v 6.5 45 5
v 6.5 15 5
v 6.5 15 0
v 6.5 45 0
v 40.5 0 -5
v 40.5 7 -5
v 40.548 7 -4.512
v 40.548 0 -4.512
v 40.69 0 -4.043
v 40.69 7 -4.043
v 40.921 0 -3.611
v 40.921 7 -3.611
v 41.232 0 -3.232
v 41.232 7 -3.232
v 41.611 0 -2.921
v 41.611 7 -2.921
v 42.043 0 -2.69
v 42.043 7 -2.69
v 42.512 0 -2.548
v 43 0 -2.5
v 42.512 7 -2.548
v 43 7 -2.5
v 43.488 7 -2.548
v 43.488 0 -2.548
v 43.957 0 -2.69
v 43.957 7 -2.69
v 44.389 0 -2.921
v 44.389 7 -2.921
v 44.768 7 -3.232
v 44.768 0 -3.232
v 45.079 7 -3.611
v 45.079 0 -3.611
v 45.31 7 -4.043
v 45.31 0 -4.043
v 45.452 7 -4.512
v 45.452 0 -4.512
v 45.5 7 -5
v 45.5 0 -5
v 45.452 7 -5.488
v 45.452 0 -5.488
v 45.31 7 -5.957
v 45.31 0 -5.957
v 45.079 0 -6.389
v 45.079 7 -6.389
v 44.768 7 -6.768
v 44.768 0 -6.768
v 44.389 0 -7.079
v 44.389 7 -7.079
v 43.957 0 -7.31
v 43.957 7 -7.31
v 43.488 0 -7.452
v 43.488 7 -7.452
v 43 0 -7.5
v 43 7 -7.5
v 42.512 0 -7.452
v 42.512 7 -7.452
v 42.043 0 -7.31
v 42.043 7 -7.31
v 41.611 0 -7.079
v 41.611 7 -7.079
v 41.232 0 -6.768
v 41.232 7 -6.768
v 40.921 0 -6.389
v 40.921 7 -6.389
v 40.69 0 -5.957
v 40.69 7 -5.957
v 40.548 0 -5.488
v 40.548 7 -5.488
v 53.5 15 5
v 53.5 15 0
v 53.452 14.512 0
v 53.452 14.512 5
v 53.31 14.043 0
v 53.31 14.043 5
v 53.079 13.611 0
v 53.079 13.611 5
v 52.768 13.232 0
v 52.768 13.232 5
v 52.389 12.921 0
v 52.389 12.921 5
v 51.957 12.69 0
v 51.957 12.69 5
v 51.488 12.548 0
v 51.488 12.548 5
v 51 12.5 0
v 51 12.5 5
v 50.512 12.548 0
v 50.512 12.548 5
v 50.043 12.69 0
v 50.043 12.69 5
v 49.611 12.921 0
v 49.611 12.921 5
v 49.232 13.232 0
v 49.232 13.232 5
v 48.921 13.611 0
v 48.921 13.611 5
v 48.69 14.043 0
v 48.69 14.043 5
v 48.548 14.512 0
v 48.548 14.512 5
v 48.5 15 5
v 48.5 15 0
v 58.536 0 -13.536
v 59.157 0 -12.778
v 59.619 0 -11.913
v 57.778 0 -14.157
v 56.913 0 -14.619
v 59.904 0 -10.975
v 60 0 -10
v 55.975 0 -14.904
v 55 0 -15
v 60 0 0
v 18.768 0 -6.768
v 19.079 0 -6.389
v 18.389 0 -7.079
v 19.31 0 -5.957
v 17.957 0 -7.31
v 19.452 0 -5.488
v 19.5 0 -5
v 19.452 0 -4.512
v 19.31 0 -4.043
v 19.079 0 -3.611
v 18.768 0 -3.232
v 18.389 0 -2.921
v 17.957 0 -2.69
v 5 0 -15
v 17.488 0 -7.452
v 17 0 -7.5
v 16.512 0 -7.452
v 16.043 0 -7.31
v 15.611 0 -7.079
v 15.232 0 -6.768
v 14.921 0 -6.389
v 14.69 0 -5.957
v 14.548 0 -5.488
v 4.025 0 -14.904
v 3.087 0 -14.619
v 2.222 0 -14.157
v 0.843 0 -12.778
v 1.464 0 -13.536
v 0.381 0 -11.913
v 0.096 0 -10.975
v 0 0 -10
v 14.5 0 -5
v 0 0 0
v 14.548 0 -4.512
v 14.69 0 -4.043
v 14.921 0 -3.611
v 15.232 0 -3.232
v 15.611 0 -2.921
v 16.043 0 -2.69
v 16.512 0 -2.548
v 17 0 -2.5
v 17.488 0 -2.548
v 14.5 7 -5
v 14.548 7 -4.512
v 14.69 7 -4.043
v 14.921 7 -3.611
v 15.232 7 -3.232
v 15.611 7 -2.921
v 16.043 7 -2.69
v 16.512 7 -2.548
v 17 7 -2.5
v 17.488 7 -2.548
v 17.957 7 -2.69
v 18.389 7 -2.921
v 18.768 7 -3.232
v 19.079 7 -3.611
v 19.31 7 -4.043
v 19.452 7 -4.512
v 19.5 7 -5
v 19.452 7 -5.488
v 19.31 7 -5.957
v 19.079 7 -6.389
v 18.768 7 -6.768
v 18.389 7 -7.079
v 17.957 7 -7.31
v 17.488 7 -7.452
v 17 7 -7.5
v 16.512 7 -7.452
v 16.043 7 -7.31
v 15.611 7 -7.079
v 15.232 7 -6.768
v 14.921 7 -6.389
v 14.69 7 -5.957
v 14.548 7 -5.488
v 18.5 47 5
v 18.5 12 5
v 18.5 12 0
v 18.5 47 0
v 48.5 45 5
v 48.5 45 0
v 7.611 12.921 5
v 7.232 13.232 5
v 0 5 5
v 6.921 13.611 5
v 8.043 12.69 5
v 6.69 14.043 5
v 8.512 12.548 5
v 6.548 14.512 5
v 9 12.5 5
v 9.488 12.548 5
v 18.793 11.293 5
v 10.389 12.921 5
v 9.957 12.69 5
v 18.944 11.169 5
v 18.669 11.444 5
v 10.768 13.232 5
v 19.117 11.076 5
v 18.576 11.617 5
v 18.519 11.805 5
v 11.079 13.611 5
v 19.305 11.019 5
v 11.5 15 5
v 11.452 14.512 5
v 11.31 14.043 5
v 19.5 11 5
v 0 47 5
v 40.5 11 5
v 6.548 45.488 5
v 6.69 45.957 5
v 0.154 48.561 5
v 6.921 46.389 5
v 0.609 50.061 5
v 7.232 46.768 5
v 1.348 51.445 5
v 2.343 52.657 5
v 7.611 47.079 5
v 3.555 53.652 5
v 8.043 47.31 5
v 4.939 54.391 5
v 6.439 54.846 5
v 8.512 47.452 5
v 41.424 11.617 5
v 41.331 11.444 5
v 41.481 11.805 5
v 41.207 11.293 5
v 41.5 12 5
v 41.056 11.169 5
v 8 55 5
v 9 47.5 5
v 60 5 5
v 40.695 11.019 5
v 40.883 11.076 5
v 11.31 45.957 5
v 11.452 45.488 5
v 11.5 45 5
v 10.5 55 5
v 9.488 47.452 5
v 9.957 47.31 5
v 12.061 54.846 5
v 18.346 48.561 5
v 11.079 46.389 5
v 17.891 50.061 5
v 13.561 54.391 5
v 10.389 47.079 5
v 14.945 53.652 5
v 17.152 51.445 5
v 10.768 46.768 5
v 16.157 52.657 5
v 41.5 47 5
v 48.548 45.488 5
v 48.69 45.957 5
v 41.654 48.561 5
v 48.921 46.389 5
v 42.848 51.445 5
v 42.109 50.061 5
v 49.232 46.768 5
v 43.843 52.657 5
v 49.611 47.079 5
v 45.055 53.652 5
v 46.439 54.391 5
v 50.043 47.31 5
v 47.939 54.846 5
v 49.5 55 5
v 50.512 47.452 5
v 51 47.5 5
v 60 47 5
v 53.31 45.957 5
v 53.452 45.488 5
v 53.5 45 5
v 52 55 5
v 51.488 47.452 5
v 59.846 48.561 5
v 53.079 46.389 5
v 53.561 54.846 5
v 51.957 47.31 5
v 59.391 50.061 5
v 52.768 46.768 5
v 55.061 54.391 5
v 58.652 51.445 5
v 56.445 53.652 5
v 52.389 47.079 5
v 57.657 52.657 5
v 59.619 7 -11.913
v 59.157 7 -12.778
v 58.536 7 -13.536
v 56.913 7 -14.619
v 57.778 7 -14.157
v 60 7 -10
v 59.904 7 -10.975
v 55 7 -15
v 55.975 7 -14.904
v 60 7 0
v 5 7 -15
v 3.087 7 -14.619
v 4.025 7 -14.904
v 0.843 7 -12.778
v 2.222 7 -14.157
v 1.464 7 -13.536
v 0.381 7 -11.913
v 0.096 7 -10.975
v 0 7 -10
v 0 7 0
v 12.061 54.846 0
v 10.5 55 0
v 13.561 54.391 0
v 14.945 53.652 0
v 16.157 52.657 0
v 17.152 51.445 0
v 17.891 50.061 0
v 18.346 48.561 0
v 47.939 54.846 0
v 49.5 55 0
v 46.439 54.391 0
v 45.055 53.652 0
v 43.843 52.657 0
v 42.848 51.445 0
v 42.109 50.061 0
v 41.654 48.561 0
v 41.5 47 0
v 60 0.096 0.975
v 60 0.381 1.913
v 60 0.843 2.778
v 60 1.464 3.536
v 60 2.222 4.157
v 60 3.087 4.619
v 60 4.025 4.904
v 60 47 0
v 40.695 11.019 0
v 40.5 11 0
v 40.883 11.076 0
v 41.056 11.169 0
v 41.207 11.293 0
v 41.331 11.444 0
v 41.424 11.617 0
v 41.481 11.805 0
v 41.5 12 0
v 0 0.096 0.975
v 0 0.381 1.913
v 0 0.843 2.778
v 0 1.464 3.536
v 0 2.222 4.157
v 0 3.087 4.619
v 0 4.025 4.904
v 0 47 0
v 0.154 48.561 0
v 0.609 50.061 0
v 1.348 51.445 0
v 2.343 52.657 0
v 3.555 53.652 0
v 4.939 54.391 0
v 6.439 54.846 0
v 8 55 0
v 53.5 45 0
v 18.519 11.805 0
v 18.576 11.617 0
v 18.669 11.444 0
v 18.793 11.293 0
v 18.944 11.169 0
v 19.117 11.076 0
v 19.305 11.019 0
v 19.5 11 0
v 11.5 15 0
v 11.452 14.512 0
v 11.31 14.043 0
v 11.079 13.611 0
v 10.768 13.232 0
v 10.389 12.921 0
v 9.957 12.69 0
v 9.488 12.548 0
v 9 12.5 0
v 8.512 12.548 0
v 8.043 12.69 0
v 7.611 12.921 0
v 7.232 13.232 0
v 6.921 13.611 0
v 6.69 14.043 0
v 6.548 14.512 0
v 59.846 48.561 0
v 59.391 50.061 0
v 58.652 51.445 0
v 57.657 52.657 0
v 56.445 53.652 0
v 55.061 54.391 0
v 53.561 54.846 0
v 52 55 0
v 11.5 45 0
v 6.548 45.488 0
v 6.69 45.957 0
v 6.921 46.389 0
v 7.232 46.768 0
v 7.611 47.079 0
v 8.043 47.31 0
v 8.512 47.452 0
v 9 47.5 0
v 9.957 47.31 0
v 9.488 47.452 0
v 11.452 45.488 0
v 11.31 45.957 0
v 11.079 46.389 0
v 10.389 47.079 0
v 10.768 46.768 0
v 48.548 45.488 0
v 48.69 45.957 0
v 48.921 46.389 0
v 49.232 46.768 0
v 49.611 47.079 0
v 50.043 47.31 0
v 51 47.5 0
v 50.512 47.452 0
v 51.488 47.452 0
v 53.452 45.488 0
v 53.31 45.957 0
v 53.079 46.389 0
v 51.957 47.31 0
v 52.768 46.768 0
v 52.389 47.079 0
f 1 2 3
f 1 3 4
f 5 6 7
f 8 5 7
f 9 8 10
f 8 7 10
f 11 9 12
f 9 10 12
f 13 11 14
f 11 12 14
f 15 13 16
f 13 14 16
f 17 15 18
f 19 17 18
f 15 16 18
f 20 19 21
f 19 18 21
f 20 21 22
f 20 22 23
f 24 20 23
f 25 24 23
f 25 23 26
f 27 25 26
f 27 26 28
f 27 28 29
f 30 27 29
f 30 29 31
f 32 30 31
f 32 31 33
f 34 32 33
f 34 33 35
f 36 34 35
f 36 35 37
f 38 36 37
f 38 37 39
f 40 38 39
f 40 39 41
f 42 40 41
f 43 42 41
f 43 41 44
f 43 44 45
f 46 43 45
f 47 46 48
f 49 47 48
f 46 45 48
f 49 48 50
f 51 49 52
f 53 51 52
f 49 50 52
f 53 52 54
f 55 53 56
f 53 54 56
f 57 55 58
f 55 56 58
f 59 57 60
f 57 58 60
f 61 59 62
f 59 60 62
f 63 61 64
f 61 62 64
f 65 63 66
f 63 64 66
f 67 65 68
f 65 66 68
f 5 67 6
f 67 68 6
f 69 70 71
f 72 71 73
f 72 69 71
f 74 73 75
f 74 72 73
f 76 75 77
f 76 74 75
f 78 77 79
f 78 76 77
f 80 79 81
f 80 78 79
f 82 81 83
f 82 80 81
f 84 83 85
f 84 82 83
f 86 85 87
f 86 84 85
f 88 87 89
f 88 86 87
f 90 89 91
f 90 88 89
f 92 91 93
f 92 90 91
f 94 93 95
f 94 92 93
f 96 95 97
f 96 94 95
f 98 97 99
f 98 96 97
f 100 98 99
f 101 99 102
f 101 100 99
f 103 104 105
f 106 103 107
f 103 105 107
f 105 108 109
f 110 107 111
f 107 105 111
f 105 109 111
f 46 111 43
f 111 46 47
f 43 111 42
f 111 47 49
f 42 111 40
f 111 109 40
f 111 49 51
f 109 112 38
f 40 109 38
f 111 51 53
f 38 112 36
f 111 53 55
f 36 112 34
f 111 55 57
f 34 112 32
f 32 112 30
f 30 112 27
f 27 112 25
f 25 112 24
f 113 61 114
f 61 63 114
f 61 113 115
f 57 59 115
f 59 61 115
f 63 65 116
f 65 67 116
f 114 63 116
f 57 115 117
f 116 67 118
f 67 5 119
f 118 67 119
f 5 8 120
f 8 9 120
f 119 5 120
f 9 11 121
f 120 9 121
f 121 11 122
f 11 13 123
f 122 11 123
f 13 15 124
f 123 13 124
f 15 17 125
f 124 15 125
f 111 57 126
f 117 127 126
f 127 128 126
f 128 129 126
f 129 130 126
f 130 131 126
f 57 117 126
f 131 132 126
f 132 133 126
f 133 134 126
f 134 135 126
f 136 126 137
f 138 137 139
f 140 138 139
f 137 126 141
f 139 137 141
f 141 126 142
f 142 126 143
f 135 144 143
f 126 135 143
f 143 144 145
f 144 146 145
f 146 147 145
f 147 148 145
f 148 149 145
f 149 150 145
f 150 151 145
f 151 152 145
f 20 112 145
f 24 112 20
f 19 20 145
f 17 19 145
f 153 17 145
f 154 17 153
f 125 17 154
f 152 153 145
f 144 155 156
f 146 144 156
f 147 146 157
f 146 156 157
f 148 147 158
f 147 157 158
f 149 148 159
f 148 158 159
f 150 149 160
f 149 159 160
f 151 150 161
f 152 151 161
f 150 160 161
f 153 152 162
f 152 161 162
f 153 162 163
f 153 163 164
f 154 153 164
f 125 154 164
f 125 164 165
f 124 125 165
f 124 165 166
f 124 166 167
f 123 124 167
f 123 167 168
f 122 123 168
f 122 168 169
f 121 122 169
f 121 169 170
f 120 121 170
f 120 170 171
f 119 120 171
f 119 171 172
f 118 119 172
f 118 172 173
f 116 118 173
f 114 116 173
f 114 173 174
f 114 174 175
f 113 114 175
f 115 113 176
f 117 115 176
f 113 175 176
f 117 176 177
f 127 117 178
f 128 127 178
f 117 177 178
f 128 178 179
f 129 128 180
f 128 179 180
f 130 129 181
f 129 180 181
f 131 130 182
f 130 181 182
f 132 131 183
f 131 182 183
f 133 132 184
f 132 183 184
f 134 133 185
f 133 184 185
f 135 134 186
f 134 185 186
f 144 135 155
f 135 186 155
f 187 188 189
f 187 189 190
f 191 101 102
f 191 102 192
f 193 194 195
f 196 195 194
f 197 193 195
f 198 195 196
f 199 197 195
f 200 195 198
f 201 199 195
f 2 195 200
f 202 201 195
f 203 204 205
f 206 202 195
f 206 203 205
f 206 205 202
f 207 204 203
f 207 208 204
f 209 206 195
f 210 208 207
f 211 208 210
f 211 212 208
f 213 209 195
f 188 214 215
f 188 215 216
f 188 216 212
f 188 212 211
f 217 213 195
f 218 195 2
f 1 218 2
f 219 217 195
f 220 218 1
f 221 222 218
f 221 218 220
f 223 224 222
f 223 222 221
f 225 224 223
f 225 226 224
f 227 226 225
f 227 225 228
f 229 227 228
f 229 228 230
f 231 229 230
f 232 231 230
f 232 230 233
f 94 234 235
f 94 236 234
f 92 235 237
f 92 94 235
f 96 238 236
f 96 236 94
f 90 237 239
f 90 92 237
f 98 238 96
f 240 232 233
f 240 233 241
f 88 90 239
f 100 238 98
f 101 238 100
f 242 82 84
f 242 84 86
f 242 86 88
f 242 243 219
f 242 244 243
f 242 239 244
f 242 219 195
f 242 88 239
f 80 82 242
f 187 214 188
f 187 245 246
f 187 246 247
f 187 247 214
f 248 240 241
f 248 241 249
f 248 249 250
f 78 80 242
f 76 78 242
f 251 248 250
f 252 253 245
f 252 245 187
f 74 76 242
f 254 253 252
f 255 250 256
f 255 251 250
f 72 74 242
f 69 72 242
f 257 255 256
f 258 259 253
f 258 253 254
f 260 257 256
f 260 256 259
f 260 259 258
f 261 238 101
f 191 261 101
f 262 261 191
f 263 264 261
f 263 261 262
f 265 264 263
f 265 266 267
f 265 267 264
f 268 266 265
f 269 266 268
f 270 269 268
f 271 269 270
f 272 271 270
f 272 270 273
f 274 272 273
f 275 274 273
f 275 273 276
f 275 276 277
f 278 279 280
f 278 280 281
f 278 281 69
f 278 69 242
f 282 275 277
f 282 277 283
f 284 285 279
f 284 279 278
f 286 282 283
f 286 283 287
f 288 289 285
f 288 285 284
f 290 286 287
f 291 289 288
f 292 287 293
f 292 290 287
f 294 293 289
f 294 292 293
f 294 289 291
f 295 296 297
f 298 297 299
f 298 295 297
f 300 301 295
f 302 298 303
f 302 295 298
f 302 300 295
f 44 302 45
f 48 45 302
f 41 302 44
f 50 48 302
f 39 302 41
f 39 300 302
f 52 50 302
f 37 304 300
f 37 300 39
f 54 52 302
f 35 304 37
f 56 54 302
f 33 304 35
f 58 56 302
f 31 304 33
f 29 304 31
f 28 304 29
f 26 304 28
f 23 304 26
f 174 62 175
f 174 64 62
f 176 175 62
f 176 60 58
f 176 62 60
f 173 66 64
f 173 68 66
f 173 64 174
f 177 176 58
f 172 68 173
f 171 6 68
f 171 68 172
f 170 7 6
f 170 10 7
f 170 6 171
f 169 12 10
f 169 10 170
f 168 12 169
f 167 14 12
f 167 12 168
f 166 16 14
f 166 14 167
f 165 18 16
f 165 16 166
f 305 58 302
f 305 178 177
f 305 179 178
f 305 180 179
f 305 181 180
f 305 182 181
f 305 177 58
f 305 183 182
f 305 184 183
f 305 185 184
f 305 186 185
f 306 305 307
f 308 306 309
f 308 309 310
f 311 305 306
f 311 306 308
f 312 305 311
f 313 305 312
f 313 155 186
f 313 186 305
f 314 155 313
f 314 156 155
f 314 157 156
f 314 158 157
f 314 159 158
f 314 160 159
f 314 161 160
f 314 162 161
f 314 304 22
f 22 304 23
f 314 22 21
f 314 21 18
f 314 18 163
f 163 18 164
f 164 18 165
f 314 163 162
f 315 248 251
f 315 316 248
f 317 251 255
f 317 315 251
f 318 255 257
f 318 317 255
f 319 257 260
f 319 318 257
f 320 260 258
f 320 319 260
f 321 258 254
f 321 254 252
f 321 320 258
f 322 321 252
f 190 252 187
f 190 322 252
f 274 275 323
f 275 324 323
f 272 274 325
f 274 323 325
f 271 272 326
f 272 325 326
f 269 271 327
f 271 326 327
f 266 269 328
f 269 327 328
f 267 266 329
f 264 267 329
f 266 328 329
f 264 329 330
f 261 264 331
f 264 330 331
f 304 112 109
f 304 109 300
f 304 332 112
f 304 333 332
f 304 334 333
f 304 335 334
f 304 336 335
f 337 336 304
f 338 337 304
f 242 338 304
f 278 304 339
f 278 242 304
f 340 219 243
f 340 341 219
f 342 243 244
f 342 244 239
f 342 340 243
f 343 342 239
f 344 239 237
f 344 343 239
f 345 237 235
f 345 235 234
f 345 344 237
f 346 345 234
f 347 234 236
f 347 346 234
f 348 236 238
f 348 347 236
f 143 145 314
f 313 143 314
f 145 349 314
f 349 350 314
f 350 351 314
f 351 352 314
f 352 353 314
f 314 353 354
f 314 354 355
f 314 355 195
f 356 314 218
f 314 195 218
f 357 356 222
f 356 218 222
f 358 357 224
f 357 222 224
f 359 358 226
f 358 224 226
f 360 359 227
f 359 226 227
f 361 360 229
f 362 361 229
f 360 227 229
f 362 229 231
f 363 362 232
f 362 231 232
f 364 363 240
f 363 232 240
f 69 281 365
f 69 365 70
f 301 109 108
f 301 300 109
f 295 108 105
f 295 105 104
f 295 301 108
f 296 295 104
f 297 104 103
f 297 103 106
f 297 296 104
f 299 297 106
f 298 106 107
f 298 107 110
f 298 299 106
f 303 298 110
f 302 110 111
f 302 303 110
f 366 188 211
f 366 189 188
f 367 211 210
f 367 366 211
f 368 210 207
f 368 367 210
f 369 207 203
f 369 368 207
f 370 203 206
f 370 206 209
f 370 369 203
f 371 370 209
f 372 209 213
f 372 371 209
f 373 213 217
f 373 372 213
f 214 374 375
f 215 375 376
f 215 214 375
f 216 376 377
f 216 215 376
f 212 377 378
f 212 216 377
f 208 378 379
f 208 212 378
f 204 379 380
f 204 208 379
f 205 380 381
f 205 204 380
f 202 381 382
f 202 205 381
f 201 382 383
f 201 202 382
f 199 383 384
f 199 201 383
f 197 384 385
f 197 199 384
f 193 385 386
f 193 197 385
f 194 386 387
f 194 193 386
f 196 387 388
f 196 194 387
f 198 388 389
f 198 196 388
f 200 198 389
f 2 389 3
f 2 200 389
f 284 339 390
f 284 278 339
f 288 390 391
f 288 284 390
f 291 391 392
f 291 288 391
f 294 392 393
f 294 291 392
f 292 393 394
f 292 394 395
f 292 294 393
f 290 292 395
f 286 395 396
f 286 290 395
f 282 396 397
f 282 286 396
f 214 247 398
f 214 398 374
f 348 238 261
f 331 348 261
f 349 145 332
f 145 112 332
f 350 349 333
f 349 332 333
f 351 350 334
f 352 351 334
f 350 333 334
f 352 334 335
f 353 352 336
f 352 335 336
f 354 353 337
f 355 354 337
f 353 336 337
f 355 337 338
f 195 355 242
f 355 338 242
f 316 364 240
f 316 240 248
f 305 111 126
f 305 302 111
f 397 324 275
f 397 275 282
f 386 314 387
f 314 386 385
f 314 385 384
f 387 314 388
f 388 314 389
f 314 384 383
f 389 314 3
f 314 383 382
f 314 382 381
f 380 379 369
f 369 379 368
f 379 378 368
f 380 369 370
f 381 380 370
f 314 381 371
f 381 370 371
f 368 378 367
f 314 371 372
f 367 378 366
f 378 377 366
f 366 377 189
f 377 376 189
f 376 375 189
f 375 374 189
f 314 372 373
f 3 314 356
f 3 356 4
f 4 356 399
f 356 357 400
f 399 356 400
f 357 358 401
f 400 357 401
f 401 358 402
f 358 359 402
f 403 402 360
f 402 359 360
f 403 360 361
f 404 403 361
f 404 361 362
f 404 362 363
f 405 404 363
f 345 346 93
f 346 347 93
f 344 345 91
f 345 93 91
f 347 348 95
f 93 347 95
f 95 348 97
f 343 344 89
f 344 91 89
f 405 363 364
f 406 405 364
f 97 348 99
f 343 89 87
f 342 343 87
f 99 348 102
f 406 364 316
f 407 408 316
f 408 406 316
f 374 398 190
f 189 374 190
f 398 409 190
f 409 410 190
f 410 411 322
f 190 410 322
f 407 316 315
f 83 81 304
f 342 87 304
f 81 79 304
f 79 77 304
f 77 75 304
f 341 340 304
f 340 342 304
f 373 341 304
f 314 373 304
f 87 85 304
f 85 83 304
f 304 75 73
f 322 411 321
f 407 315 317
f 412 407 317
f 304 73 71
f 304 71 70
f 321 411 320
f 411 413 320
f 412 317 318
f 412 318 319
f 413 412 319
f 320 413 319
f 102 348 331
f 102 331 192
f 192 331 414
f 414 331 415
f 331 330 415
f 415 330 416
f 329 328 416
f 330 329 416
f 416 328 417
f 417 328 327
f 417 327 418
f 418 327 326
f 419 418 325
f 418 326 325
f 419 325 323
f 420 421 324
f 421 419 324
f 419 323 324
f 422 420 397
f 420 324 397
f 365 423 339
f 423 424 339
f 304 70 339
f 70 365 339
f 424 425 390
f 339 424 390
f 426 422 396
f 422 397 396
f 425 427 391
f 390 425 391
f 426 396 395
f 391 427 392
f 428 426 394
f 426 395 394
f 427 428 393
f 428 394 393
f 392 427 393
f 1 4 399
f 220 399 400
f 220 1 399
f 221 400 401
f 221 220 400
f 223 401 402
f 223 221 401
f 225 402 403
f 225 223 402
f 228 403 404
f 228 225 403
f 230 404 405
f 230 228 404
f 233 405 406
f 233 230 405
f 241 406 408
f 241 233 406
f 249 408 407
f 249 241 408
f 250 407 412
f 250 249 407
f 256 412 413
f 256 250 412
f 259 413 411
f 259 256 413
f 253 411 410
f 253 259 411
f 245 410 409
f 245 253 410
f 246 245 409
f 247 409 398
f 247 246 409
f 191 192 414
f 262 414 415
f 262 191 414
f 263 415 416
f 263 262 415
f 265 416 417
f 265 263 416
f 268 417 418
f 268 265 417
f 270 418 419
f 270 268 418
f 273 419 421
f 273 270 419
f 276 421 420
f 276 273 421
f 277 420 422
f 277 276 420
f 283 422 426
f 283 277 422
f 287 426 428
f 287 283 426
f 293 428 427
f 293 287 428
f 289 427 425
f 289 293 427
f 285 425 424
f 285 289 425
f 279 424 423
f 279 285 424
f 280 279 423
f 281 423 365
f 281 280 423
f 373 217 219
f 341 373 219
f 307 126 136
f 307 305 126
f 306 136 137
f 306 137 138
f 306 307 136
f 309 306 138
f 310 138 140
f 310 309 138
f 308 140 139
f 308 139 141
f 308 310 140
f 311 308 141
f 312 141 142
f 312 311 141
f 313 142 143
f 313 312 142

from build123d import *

# Parameters (mm, degrees)
SKETCH1_W           = 60
SKETCH1_H           = 55
BOSS_EXTRUDE1_DEPTH = 5
CUT_EXTRUDE1_REACH  = 83.548
SKETCH2_W           = 23
SKETCH2_H           = 44
SKETCH3_W           = 60
SKETCH3_H           = 7
BOSS_EXTRUDE2_DEPTH = 15
CUT_EXTRUDE2_REACH  = 80.288
SKETCH4_R           = 2.5
FILLET1_R           = 8
FILLET2_R           = 5
FILLET3_R           = 5
FILLET4_R           = 1


with BuildPart() as part:
    # Sketch1 → Boss-Extrude1 (new body)
    with BuildSketch(Plane.XY):
        with Locations((30, 27.5)):
            Rectangle(SKETCH1_W, SKETCH1_H)
    extrude(amount=BOSS_EXTRUDE1_DEPTH)

    # Sketch2 → Cut-Extrude1 (cut, up to next)
    with BuildSketch(Plane.XY.offset(5), mode=Mode.PRIVATE) as cut_extrude1_sk1:
        with BuildLine():
            Line((11.5, 45), (11.5, 15))
            ThreePointArc((11.5, 15), (9, 12.5), (6.5, 15))
            Line((6.5, 15), (6.5, 45))
            ThreePointArc((6.5, 45), (9, 47.5), (11.5, 45))
        make_face()
    cut_extrude1_tool1 = extrude(cut_extrude1_sk1.sketch, amount=-CUT_EXTRUDE1_REACH, mode=Mode.PRIVATE) & part.part
    # Sketch2 → Cut-Extrude1 (cut, up to next)
    with BuildSketch(Plane.XY.offset(5), mode=Mode.PRIVATE) as cut_extrude1_sk2:
        with BuildLine():
            Line((53.5, 45), (53.5, 15))
            ThreePointArc((53.5, 15), (51, 12.5), (48.5, 15))
            Line((48.5, 15), (48.5, 45))
            ThreePointArc((48.5, 45), (51, 47.5), (53.5, 45))
        make_face()
    cut_extrude1_tool2 = extrude(cut_extrude1_sk2.sketch, amount=-CUT_EXTRUDE1_REACH, mode=Mode.PRIVATE) & part.part
    # Sketch2 → Cut-Extrude1 (cut, up to next)
    with BuildSketch(Plane.XY.offset(5), mode=Mode.PRIVATE) as cut_extrude1_sk3:
        with Locations((30, 33)):
            Rectangle(SKETCH2_W, SKETCH2_H)
    cut_extrude1_tool3 = extrude(cut_extrude1_sk3.sketch, amount=-CUT_EXTRUDE1_REACH, mode=Mode.PRIVATE) & part.part
    add(cut_extrude1_tool1.solids().sort_by_distance((9, 30, 5))[0], mode=Mode.SUBTRACT)
    add(cut_extrude1_tool2.solids().sort_by_distance((51, 30, 5))[0], mode=Mode.SUBTRACT)
    add(cut_extrude1_tool3.solids().sort_by_distance((30, 33, 5))[0], mode=Mode.SUBTRACT)

    # Sketch3 → Boss-Extrude2 (add)
    with BuildSketch(Plane(origin=(0, 0, 0), x_dir=(-1, 0, 0), z_dir=(0, 0, -1))):
        with Locations((-30, 3.5)):
            Rectangle(SKETCH3_W, SKETCH3_H)
    extrude(amount=BOSS_EXTRUDE2_DEPTH)

    # Sketch4 → Cut-Extrude2 (cut, up to next)
    with BuildSketch(Plane(origin=(0, 7, 0), x_dir=(1, 0, 0), z_dir=(0, 1, 0)), mode=Mode.PRIVATE) as cut_extrude2_sk1:
        with Locations(Location((17, 5, 0), (0, 0, 180))):
            Circle(SKETCH4_R)
    cut_extrude2_tool1 = extrude(cut_extrude2_sk1.sketch, amount=-CUT_EXTRUDE2_REACH, mode=Mode.PRIVATE) & part.part
    # Sketch4 → Cut-Extrude2 (cut, up to next)
    with BuildSketch(Plane(origin=(0, 7, 0), x_dir=(1, 0, 0), z_dir=(0, 1, 0)), mode=Mode.PRIVATE) as cut_extrude2_sk2:
        with Locations(Location((43, 5, 0), (0, 0, 180))):
            Circle(SKETCH4_R)
    cut_extrude2_tool2 = extrude(cut_extrude2_sk2.sketch, amount=-CUT_EXTRUDE2_REACH, mode=Mode.PRIVATE) & part.part
    add(cut_extrude2_tool1.solids().sort_by_distance((17, 7, -5))[0], mode=Mode.SUBTRACT)
    add(cut_extrude2_tool2.solids().sort_by_distance((43, 7, -5))[0], mode=Mode.SUBTRACT)

    # Fillet1
    fillet1_edges = [part.edges().sort_by_distance(p)[0] for p in [
        (18.5, 55, 2.5),
        (41.5, 55, 2.5),
        (0, 55, 2.5),
        (60, 55, 2.5),
    ]]
    fillet(fillet1_edges, radius=FILLET1_R)

    # Fillet2
    fillet2_edges = [part.edges().sort_by_distance(p)[0] for p in [
        (0, 3.5, -15),
        (60, 3.5, -15),
    ]]
    fillet(fillet2_edges, radius=FILLET2_R)

    # Fillet3
    fillet3_edges = [part.edges().sort_by_distance(p)[0] for p in [
        (30, 0, 5),
    ]]
    fillet(fillet3_edges, radius=FILLET3_R)

    # Fillet4
    fillet4_edges = [part.edges().sort_by_distance(p)[0] for p in [
        (18.5, 11, 2.5),
        (41.5, 11, 2.5),
    ]]
    fillet(fillet4_edges, radius=FILLET4_R)


solid = part.part
